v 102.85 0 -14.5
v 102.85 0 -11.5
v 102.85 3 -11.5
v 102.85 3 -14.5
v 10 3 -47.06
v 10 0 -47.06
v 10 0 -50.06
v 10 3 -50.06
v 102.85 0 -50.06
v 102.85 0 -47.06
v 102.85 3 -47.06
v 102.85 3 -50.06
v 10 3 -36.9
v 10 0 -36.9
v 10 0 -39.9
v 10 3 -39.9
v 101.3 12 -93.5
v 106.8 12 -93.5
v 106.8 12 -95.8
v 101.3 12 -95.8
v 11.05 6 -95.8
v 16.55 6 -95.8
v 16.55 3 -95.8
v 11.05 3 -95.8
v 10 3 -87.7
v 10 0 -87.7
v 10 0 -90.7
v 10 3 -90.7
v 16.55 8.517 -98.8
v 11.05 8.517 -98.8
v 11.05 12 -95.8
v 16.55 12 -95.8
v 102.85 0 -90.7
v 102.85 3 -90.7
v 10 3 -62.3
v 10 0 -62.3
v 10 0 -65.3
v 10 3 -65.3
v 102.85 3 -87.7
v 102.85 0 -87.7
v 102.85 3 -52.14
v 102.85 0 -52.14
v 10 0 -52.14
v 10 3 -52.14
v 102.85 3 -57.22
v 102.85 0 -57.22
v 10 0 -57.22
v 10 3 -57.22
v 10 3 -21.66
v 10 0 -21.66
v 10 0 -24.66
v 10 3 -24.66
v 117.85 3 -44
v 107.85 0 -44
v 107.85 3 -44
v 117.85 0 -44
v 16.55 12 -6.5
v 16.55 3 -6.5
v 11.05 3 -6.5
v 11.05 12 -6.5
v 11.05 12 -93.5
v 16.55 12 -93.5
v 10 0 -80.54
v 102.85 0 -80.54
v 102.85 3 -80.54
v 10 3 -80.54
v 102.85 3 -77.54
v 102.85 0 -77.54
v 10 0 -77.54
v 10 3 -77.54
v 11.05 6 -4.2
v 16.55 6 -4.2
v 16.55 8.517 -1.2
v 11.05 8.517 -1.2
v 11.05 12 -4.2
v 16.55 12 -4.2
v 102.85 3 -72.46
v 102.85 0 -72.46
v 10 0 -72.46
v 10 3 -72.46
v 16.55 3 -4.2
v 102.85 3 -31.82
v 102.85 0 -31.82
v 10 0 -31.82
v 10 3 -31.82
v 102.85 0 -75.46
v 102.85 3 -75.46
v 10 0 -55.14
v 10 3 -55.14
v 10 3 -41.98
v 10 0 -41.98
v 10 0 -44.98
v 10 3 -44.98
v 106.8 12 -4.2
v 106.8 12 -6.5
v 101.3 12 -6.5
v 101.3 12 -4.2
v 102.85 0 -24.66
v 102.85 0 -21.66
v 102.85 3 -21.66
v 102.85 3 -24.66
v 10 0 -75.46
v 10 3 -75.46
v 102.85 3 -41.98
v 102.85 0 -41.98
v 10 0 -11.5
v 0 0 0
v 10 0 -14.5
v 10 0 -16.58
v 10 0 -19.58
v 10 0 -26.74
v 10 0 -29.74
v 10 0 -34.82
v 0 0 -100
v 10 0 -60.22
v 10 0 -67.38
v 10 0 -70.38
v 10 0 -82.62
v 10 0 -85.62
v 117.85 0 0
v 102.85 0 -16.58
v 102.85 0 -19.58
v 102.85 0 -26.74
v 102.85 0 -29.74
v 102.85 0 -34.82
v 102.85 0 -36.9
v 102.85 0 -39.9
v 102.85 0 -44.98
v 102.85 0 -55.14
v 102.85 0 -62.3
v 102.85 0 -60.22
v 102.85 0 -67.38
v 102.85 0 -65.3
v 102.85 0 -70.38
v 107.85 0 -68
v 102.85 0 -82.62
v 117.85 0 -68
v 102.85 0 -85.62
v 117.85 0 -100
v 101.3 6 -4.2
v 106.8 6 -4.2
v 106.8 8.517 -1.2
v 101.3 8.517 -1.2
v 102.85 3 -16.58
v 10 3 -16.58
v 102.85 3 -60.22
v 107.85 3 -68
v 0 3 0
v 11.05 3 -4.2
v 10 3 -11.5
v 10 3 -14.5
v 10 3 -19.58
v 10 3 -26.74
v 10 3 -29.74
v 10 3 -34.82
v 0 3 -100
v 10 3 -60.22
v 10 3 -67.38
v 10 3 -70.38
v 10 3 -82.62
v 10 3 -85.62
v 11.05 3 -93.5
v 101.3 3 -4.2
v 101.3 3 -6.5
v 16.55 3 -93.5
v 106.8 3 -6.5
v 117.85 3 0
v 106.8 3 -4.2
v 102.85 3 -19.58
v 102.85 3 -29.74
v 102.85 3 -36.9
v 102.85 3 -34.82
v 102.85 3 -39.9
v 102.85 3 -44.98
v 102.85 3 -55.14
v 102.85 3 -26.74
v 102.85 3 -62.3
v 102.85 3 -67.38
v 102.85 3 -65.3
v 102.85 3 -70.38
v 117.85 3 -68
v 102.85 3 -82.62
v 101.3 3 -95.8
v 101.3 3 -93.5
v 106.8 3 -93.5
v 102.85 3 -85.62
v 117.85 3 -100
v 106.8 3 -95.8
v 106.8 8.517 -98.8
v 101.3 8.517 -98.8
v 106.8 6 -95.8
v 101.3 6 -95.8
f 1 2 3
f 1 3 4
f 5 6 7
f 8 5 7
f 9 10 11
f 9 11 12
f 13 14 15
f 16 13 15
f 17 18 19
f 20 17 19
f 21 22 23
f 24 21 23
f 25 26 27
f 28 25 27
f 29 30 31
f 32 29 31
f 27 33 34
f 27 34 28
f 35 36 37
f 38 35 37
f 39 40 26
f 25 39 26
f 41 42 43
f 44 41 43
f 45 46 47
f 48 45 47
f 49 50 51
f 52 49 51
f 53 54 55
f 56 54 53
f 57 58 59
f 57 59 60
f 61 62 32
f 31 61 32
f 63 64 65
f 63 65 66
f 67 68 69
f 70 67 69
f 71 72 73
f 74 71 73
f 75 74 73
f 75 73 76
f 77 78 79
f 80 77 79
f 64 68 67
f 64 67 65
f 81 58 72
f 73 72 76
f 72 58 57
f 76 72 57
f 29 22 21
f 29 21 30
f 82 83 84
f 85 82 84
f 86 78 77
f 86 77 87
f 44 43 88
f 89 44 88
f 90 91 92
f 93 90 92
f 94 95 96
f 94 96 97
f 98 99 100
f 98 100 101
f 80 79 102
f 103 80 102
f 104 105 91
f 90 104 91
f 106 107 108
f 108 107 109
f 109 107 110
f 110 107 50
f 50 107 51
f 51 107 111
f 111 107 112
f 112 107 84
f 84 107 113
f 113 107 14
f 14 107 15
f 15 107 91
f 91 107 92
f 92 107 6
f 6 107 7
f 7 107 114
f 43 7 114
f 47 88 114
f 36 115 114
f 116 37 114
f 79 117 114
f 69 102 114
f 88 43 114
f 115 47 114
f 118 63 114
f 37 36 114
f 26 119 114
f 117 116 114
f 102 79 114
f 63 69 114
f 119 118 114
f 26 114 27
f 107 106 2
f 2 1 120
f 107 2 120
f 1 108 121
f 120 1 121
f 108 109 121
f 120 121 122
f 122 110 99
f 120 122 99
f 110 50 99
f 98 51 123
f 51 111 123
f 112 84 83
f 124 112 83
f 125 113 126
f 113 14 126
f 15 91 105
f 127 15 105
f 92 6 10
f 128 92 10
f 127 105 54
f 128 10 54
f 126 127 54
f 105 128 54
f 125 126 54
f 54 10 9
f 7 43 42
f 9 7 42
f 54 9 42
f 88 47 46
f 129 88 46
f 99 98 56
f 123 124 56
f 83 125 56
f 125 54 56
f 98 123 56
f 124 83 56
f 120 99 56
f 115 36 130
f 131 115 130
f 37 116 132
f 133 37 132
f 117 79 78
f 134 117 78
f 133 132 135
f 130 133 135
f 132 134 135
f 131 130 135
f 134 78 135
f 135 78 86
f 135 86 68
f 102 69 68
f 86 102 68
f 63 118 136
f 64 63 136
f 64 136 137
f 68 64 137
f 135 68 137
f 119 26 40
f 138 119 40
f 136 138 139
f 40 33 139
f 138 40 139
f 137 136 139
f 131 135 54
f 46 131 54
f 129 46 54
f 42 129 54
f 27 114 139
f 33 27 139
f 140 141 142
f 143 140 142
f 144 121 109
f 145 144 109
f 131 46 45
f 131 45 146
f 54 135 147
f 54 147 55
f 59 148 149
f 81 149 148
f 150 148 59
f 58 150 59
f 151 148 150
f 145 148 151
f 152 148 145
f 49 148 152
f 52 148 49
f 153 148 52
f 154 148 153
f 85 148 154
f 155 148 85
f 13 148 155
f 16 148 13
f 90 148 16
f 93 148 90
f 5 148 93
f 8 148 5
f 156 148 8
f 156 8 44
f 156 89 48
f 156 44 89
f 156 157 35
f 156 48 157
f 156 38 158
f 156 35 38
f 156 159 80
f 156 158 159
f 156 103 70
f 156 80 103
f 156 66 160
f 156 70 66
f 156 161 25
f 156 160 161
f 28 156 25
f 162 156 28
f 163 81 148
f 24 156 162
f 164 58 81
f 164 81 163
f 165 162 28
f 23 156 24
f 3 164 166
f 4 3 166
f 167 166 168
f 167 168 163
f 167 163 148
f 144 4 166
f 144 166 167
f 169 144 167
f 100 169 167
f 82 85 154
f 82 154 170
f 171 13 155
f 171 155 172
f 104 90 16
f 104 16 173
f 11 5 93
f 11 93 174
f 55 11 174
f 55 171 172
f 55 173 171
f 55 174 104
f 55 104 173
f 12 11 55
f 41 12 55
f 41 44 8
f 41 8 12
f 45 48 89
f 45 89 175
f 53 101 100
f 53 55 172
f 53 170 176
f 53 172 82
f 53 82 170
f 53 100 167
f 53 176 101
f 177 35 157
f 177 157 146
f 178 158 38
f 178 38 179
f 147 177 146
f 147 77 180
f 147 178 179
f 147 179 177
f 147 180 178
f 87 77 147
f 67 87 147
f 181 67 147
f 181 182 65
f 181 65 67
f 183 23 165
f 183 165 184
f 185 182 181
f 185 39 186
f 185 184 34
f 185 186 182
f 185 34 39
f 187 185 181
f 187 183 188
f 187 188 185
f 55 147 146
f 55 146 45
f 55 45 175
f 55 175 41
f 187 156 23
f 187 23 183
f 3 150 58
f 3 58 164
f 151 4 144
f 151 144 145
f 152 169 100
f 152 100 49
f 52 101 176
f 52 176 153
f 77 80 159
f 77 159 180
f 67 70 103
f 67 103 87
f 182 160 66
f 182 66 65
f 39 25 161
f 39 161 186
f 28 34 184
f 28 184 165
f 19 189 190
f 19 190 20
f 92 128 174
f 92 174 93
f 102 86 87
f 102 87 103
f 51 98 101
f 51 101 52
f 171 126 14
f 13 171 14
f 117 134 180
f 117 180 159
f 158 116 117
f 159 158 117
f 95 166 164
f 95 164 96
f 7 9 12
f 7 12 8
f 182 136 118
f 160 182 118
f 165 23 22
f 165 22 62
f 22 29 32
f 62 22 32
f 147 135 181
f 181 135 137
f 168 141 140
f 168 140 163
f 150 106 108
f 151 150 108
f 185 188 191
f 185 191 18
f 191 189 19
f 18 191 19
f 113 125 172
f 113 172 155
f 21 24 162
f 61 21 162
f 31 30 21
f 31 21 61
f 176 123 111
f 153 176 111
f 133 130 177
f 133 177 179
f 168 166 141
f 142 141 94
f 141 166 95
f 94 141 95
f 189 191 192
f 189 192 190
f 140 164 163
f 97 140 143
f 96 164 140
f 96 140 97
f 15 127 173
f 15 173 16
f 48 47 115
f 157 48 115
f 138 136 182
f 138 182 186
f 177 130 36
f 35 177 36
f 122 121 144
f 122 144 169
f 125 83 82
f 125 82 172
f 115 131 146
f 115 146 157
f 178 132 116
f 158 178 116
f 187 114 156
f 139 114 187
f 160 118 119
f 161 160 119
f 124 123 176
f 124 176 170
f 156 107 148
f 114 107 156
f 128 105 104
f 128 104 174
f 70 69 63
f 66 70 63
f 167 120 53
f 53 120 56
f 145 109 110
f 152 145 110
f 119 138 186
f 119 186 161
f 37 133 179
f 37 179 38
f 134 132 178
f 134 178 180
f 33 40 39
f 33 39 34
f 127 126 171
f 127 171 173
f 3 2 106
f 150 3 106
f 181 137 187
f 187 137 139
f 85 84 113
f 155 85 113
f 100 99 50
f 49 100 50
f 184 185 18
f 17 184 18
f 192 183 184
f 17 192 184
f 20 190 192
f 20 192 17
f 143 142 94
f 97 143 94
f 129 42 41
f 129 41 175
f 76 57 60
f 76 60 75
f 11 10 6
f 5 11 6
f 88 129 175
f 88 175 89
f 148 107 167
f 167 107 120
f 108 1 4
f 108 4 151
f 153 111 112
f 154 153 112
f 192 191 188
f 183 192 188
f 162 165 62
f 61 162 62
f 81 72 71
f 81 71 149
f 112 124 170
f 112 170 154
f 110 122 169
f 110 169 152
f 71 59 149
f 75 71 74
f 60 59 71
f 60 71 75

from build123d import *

# Parameters (mm, degrees)
SKETCH1_W               = 117.85
SKETCH1_H               = 100
BOSS_EXTRUDE1_DEPTH     = 3
BOSS_EXTRUDE2_DEPTH     = 117.85
SKETCH3_W               = 10
SKETCH3_H               = 24
CUT_EXTRUDE1_DEPTH      = 3
CUT_EXTRUDE2_DEPTH      = 129.579245993
CUT_EXTRUDE2_DEPTH_BACK = 129.579245993
SKETCH4_W               = 11.05
SKETCH4_H               = 9
SKETCH4_W_2             = 84.75
SKETCH5_W               = 92.85
SKETCH5_H               = 3
CUT_EXTRUDE3_DEPTH      = 3


with BuildPart() as part:
    # Sketch1 → Boss-Extrude1 (new body)
    with BuildSketch(Plane(origin=(0, 0, 0), x_dir=(1, 0, 0), z_dir=(0, 1, 0))):
        with Locations((58.925, 50)):
            Rectangle(SKETCH1_W, SKETCH1_H)
    extrude(amount=BOSS_EXTRUDE1_DEPTH)

    # Sketch2 → Boss-Extrude2 (add)
    with BuildSketch(Plane(origin=(117.85, 0, 0), x_dir=(0, 0, -1), z_dir=(1, 0, 0))):
        Polygon((4.2, 6), (4.2, 3), (6.5, 3), (6.5, 12), (4.2, 12), align=None)
        Polygon((4.2, 12), (4.2, 6), (1.2, 8.517298894), align=None)
    boss_extrude2 = extrude(amount=-BOSS_EXTRUDE2_DEPTH)

    # Sketch3 → Cut-Extrude1 (cut)
    with BuildSketch(Plane.XZ):
        with Locations((112.85, -56)):
            Rectangle(SKETCH3_W, SKETCH3_H)
    extrude(amount=-CUT_EXTRUDE1_DEPTH, mode=Mode.SUBTRACT)

    # Mirror1: Boss-Extrude2 across plane
    add(boss_extrude2.mirror(Plane.XY.offset(-50)))

    # Sketch4 → Cut-Extrude2 (cut, two sides: drawn at the far end of the back side and taken through both)
    with BuildSketch(Plane.XY.offset(-50).offset(-CUT_EXTRUDE2_DEPTH_BACK)):
        with Locations((5.525, 7.5)):
            Rectangle(SKETCH4_W, SKETCH4_H)
        with Locations((112.325, 7.5)):
            Rectangle(SKETCH4_W, SKETCH4_H)
        with Locations((58.925, 7.5)):
            Rectangle(SKETCH4_W_2, SKETCH4_H)
    extrude(amount=CUT_EXTRUDE2_DEPTH + CUT_EXTRUDE2_DEPTH_BACK, mode=Mode.SUBTRACT)

    # Sketch5 → Cut-Extrude3 (cut)
    with BuildSketch(Plane(origin=(0, 0, 0), x_dir=(-1, 0, 0), z_dir=(0, -1, 0))):
        with Locations((-56.425, 13)):
            Rectangle(SKETCH5_W, SKETCH5_H)
        with Locations((-56.425, 18.08)):
            Rectangle(SKETCH5_W, SKETCH5_H)
        with Locations((-56.425, 23.16)):
            Rectangle(SKETCH5_W, SKETCH5_H)
        with Locations((-56.425, 28.24)):
            Rectangle(SKETCH5_W, SKETCH5_H)
        with Locations((-56.425, 33.32)):
            Rectangle(SKETCH5_W, SKETCH5_H)
        with Locations((-56.425, 38.4)):
            Rectangle(SKETCH5_W, SKETCH5_H)
        with Locations((-56.425, 43.48)):
            Rectangle(SKETCH5_W, SKETCH5_H)
        with Locations((-56.425, 48.56)):
            Rectangle(SKETCH5_W, SKETCH5_H)
        with Locations((-56.425, 53.64)):
            Rectangle(SKETCH5_W, SKETCH5_H)
        with Locations((-56.425, 58.72)):
            Rectangle(SKETCH5_W, SKETCH5_H)
        with Locations((-56.425, 63.8)):
            Rectangle(SKETCH5_W, SKETCH5_H)
        with Locations((-56.425, 68.88)):
            Rectangle(SKETCH5_W, SKETCH5_H)
        with Locations((-56.425, 73.96)):
            Rectangle(SKETCH5_W, SKETCH5_H)
        with Locations((-56.425, 79.04)):
            Rectangle(SKETCH5_W, SKETCH5_H)
        with Locations((-56.425, 84.12)):
            Rectangle(SKETCH5_W, SKETCH5_H)
        with Locations((-56.425, 89.2)):
            Rectangle(SKETCH5_W, SKETCH5_H)
    extrude(amount=-CUT_EXTRUDE3_DEPTH, mode=Mode.SUBTRACT)


solid = part.part
